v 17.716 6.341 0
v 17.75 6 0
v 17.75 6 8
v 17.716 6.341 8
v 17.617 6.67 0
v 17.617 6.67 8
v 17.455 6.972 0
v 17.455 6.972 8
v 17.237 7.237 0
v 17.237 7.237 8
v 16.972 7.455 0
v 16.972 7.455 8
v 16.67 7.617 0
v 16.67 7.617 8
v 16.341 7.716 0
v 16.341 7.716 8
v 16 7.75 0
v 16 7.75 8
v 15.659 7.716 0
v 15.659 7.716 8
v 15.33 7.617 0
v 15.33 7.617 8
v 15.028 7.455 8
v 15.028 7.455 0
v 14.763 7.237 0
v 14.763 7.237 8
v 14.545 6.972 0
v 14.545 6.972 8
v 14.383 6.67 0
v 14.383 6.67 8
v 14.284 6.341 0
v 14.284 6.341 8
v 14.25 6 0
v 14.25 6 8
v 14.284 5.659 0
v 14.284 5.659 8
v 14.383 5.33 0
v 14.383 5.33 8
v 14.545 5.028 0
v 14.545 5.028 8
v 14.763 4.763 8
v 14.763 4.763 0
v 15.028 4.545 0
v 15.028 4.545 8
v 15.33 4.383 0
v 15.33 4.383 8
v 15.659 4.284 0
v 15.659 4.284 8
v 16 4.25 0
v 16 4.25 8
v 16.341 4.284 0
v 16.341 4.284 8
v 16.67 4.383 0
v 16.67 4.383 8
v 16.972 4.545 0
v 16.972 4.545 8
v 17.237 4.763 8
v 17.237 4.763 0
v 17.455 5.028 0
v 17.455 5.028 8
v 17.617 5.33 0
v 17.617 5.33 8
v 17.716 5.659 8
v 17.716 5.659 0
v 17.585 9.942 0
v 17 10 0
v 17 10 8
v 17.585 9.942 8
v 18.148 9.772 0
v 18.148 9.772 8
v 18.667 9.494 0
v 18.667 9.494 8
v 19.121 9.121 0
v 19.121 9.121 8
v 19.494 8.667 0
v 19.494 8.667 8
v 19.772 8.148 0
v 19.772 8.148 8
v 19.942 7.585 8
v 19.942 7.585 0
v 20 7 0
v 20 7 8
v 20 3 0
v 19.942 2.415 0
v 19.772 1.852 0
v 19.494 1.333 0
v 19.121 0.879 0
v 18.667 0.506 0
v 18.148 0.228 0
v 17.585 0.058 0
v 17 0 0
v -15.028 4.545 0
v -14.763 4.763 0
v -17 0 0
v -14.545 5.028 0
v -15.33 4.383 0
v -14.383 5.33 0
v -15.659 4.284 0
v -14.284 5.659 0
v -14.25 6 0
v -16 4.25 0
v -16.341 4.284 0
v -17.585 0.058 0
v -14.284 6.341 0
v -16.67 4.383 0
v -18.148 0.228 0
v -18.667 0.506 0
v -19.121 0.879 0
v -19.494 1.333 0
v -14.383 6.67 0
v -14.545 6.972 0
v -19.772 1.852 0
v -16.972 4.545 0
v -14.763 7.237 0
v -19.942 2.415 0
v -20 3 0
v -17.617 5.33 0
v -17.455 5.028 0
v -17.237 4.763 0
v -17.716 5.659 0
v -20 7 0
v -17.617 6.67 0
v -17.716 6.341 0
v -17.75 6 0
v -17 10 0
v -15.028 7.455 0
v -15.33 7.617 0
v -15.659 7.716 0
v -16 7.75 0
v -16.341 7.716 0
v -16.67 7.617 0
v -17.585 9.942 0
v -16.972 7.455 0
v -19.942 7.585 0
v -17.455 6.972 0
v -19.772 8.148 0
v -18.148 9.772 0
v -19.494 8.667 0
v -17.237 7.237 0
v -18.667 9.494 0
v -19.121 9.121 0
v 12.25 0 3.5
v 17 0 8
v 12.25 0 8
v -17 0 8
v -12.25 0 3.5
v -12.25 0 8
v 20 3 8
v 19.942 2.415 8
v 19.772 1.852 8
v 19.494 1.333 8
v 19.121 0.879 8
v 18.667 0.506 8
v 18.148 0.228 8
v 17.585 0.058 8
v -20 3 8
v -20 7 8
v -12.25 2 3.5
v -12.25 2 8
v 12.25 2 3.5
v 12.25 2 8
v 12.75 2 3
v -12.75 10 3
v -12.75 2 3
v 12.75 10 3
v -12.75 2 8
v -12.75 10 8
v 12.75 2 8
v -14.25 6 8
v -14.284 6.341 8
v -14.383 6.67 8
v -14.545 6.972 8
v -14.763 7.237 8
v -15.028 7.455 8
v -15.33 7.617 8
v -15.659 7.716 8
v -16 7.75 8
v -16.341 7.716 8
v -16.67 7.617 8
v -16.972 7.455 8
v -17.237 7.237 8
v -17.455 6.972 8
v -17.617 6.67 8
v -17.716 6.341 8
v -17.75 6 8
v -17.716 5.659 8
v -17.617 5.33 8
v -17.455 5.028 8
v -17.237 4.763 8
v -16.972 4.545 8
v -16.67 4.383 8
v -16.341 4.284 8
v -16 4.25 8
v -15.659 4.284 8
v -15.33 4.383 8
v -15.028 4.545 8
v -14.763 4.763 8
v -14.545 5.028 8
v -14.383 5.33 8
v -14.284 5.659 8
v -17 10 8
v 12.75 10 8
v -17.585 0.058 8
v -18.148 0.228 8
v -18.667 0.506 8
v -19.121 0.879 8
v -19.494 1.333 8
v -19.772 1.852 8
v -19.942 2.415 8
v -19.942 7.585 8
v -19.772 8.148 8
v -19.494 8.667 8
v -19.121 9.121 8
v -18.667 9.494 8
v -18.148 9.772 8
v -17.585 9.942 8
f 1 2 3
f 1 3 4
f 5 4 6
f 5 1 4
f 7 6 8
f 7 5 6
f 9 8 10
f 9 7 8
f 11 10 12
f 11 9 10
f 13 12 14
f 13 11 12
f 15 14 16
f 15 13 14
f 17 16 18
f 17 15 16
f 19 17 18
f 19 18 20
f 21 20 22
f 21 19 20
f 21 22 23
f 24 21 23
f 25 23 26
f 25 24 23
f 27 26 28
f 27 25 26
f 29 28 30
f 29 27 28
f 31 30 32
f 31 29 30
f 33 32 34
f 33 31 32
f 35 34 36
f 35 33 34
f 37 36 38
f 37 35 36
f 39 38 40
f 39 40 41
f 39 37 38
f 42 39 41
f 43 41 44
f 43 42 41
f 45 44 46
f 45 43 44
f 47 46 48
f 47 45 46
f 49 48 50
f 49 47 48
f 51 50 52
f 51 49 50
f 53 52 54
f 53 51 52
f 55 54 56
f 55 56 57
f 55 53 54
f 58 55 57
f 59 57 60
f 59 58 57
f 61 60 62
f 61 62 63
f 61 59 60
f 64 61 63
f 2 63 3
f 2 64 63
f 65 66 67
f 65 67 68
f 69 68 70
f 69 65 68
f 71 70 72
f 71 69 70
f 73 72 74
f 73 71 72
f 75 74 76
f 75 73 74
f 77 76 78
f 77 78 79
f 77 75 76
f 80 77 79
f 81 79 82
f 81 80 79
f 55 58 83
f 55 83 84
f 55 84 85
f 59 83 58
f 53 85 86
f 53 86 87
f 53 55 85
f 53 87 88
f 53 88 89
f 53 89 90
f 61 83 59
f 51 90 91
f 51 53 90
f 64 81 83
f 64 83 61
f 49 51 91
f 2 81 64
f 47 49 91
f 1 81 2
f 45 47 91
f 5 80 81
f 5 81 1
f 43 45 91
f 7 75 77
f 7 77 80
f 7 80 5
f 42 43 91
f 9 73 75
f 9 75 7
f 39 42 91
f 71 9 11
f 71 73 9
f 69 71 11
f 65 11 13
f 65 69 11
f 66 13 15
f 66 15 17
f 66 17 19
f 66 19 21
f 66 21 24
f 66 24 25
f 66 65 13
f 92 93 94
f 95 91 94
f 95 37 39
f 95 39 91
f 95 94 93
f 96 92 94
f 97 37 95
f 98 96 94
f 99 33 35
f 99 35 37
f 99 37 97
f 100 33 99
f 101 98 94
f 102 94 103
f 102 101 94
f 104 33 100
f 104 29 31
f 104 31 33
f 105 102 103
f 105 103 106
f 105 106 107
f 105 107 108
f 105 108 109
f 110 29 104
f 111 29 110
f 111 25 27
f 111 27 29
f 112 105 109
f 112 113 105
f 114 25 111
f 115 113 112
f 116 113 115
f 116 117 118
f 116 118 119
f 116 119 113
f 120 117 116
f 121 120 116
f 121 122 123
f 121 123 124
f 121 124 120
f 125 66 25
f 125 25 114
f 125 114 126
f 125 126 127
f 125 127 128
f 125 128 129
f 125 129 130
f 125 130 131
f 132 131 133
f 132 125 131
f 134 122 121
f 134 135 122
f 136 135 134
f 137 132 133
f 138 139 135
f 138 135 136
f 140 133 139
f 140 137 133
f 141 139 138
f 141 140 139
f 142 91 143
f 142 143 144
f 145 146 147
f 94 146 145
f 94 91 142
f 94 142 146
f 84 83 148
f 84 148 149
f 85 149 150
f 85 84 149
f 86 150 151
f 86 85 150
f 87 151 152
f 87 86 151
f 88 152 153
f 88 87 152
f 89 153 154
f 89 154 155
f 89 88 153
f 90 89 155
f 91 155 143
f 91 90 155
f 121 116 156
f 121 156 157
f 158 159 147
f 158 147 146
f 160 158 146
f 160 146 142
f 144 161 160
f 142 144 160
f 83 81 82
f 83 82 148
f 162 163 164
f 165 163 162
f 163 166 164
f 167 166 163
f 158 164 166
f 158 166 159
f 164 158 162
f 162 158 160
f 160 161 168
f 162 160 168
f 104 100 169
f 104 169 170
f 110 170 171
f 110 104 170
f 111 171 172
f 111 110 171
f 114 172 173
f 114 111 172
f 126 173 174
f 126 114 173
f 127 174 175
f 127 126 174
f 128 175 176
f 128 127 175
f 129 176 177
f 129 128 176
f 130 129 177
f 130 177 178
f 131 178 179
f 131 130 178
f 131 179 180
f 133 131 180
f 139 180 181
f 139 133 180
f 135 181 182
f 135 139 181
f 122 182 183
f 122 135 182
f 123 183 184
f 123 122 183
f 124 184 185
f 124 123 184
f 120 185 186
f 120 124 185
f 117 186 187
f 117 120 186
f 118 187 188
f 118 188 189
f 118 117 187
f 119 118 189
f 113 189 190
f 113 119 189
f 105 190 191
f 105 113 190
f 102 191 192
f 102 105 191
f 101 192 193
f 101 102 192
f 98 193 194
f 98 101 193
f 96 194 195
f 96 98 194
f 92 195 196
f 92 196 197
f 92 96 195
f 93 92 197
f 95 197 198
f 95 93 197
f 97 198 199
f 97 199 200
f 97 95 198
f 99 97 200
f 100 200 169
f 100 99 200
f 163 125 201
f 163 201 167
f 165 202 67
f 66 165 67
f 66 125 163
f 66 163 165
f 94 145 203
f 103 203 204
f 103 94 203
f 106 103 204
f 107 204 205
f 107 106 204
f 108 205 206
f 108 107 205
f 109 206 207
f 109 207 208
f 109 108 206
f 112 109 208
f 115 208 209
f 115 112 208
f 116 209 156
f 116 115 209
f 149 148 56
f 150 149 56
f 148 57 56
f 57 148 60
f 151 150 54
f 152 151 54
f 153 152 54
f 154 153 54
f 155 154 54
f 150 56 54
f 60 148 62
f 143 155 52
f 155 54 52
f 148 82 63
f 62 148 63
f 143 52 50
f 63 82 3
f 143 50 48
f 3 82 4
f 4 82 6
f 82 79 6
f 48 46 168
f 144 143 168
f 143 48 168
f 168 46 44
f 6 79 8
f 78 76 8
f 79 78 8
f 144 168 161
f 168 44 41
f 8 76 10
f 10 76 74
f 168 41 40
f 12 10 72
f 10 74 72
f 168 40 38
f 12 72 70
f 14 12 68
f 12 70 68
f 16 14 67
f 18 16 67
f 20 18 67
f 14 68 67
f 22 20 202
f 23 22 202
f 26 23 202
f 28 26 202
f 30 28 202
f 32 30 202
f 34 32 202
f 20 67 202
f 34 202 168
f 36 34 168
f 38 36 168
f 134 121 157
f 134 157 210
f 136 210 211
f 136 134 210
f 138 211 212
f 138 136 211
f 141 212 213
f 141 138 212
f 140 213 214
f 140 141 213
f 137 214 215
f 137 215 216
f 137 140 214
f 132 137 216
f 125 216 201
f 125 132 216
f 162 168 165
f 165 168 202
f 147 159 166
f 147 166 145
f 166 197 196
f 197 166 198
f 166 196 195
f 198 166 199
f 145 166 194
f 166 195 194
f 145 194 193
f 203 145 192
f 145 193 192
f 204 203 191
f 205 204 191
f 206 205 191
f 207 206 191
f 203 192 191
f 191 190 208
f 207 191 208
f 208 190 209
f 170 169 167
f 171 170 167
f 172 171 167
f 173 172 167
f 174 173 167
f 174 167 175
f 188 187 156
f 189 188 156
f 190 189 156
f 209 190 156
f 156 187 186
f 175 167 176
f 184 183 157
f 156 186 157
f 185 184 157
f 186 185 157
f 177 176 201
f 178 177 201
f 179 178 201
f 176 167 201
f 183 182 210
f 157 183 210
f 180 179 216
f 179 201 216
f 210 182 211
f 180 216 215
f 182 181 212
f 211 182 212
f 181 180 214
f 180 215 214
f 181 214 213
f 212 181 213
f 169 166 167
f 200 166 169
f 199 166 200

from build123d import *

# Parameters (mm, degrees)
SKETCH1_R           = 1.75
BOSS_EXTRUDE1_DEPTH = 8
SKETCH2_W           = 25.5
SKETCH2_H           = 8
CUT_EXTRUDE1_DEPTH  = 5
SKETCH3_W           = 24.5
SKETCH3_H           = 4.5
CUT_EXTRUDE2_DEPTH  = 3


with BuildPart() as part:
    # Sketch1 → Boss-Extrude1 (new body)
    with BuildSketch(Plane.XY):
        with BuildLine():
            Line((-17, 10), (17, 10))
            ThreePointArc((17, 10), (19.121320344, 9.121320344), (20, 7))
            Line((20, 7), (20, 3))
            ThreePointArc((20, 3), (19.121320344, 0.878679656), (17, 0))
            Line((17, 0), (-17, 0))
            ThreePointArc((-17, 0), (-19.121320344, 0.878679656), (-20, 3))
            Line((-20, 3), (-20, 7))
            ThreePointArc((-20, 7), (-19.121320344, 9.121320344), (-17, 10))
        make_face()
        with Locations((-16, 6)):
            Circle(SKETCH1_R, mode=Mode.SUBTRACT)
        with Locations((16, 6)):
            Circle(SKETCH1_R, mode=Mode.SUBTRACT)
    extrude(amount=BOSS_EXTRUDE1_DEPTH)

    # Sketch2 → Cut-Extrude1 (cut)
    with BuildSketch(Plane.XY.offset(8)):
        with Locations((0, 6)):
            Rectangle(SKETCH2_W, SKETCH2_H)
    extrude(amount=-CUT_EXTRUDE1_DEPTH, mode=Mode.SUBTRACT)

    # Sketch3 → Cut-Extrude2 (cut, through all)
    with BuildSketch(Plane(origin=(0, 2, 0), x_dir=(1, 0, 0), z_dir=(0, 1, 0))):
        with Locations((0, -5.75)):
            Rectangle(SKETCH3_W, SKETCH3_H)
    extrude(amount=-CUT_EXTRUDE2_DEPTH, mode=Mode.SUBTRACT)


solid = part.part
